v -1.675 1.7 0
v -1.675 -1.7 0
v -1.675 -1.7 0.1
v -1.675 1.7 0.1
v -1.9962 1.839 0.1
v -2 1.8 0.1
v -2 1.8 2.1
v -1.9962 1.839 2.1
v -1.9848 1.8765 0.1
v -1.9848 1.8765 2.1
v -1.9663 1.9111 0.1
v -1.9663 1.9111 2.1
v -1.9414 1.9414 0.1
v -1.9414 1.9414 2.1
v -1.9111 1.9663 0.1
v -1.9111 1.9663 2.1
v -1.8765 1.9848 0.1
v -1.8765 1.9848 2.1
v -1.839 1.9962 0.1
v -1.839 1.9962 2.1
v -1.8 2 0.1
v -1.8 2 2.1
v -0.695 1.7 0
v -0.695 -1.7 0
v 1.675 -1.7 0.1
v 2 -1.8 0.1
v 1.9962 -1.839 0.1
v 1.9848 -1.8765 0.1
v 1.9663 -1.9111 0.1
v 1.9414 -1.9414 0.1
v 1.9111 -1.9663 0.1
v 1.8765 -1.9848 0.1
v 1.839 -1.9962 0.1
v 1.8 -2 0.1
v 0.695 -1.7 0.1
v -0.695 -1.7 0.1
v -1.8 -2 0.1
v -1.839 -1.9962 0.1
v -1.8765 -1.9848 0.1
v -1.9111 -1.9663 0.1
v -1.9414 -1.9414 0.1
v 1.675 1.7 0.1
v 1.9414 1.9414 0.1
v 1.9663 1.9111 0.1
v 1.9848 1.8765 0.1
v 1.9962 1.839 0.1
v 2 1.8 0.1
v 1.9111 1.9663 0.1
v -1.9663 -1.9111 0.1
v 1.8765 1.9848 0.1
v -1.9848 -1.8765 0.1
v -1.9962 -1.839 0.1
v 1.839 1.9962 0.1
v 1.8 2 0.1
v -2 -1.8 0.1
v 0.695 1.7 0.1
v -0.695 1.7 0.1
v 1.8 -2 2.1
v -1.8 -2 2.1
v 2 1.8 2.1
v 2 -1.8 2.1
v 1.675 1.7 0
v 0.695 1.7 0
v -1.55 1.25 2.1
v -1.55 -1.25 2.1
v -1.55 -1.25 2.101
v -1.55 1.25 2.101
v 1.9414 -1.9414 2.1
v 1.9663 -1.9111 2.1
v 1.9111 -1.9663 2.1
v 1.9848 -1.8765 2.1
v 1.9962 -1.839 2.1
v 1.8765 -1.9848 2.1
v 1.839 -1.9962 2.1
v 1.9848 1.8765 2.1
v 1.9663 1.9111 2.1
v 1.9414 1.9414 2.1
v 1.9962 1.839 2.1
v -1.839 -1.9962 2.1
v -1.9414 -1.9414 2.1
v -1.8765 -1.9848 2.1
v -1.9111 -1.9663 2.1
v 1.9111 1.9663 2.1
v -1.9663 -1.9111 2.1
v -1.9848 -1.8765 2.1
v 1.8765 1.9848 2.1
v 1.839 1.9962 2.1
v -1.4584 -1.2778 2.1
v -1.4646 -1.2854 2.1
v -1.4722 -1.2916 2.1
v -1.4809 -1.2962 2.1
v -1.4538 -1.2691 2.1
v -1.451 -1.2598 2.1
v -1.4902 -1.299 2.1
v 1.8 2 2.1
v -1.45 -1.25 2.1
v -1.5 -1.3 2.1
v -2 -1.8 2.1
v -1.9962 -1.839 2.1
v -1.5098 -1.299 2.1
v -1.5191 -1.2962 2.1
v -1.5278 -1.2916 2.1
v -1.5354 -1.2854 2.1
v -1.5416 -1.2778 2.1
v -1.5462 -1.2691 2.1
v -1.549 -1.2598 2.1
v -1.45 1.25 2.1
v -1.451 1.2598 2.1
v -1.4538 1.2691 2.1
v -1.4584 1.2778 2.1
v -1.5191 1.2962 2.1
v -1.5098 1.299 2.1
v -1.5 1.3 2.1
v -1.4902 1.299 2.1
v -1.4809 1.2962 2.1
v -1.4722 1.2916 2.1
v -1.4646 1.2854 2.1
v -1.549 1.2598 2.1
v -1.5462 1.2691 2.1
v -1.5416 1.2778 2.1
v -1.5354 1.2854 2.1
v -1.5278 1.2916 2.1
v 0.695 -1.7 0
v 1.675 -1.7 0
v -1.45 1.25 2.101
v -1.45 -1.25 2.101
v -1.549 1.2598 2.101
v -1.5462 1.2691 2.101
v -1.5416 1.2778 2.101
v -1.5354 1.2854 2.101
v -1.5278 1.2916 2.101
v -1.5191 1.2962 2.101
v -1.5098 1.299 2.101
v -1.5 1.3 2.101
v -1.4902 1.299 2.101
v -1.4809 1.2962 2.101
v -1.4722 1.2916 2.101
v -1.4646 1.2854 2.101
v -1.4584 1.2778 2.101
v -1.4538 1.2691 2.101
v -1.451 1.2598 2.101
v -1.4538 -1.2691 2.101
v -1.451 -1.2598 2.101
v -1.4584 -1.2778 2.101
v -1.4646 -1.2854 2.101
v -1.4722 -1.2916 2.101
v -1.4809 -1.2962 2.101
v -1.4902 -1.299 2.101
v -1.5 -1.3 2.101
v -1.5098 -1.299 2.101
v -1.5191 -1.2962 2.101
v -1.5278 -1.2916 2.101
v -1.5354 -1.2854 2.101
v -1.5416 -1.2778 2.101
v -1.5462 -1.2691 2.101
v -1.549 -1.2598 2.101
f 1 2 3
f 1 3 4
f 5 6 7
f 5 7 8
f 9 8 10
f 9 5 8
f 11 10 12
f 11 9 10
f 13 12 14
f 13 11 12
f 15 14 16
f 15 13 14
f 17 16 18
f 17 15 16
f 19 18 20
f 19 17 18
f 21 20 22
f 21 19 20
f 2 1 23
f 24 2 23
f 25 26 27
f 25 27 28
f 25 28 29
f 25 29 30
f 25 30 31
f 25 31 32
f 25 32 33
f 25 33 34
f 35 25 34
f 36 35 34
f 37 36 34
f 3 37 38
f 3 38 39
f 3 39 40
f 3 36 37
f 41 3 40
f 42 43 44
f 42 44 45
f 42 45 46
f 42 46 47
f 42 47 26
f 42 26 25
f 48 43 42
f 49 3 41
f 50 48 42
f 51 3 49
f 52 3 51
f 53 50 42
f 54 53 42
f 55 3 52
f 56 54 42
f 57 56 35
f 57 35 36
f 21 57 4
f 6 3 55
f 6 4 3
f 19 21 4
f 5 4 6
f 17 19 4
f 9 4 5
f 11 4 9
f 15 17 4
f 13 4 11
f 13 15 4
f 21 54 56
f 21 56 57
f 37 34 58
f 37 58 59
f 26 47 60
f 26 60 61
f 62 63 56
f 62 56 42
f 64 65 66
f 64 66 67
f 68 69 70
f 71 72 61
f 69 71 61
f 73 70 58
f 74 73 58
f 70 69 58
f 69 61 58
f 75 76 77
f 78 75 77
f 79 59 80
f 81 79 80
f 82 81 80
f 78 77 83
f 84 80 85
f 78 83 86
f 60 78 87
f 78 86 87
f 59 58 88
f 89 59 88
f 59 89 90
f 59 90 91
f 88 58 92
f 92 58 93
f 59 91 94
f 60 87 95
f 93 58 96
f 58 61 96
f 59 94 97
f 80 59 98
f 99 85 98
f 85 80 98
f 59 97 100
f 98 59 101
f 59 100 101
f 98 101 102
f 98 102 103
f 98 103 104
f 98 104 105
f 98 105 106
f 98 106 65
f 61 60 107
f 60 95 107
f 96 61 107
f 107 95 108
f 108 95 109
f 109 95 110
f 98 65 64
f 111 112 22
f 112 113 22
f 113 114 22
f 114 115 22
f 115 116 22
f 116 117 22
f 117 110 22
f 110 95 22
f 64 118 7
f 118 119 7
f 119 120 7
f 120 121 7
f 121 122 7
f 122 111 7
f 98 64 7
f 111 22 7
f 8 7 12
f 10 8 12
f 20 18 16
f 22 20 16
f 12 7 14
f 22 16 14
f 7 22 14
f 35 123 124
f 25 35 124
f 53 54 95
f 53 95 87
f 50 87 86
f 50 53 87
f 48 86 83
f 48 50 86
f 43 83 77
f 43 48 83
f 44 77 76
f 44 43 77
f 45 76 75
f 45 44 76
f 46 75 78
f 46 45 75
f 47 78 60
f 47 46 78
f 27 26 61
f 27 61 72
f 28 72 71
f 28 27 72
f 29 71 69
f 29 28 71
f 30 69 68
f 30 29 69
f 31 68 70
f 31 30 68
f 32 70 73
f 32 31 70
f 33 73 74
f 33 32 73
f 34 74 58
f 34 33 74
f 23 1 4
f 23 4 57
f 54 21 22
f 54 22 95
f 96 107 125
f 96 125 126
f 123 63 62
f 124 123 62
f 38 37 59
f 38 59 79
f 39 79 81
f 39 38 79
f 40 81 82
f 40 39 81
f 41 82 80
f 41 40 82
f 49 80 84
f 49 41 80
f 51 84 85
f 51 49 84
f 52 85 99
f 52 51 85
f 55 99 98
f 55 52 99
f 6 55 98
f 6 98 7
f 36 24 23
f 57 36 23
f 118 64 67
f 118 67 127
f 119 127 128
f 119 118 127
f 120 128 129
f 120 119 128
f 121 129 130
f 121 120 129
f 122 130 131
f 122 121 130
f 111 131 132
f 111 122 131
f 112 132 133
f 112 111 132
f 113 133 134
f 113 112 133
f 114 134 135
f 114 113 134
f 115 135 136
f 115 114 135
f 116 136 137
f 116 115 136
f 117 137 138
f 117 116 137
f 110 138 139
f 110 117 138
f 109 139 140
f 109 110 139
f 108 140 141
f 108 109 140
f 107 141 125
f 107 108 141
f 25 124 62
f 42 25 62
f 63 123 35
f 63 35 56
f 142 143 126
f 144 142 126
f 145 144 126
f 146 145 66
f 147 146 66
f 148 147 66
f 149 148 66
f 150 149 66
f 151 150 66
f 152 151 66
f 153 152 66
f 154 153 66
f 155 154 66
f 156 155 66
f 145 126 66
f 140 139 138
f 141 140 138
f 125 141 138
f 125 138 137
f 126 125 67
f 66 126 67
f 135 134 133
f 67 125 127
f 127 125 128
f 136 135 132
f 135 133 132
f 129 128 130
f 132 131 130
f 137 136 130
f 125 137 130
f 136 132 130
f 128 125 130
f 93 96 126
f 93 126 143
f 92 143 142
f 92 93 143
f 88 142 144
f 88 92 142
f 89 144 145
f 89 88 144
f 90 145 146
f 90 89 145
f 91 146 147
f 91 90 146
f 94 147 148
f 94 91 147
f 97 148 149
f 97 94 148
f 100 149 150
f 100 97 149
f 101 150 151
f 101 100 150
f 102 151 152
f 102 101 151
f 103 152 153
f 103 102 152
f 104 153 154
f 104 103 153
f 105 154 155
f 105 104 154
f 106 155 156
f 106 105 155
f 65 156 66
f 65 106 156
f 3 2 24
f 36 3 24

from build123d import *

# Parameters (mm, degrees)
ESQUISSE2_W  = 0.98
ESQUISSE2_H  = 3.4
PADS_DEPTH   = 0.1
PADS_2_DEPTH = 0.1
BODY_DEPTH   = 2
MARK_DEPTH   = 0.001


with BuildPart() as part:
    # Esquisse2 → pads (new body)
    with BuildSketch(Plane.XY):
        with Locations((-1.185, 0)):
            Rectangle(ESQUISSE2_W, ESQUISSE2_H)
    extrude(amount=PADS_DEPTH)



with BuildPart() as body_2:
    # Esquisse2 → pads 2 (new body)
    with BuildSketch(Plane.XY):
        with Locations((1.185, 0)):
            Rectangle(ESQUISSE2_W, ESQUISSE2_H)
    extrude(amount=PADS_2_DEPTH)


with BuildPart() as part_1:
    add(part.part)

    add(body_2.part)  # body merges body 2
    # Esquisse1 → body (add)
    with BuildSketch(Plane.XY.offset(0.1)):
        with BuildLine():
            Line((-1.8, 2), (1.8, 2))
            ThreePointArc((1.8, 2), (1.941421356, 1.941421356), (2, 1.8))
            Line((2, 1.8), (2, -1.8))
            ThreePointArc((2, -1.8), (1.941421356, -1.941421356), (1.8, -2))
            Line((1.8, -2), (-1.8, -2))
            ThreePointArc((-1.8, -2), (-1.941421356, -1.941421356), (-2, -1.8))
            Line((-2, -1.8), (-2, 1.8))
            ThreePointArc((-2, 1.8), (-1.941421356, 1.941421356), (-1.8, 2))
        make_face()
    extrude(amount=BODY_DEPTH)

    # Esquisse3 → mark (add)
    with BuildSketch(Plane.XY.offset(2.1)):
        with BuildLine():
            Line((-1.55, -1.25), (-1.55, 1.25))
            ThreePointArc((-1.55, 1.25), (-1.5, 1.3), (-1.45, 1.25))
            Line((-1.45, 1.25), (-1.45, -1.25))
            ThreePointArc((-1.45, -1.25), (-1.5, -1.3), (-1.55, -1.25))
        make_face()
    extrude(amount=MARK_DEPTH)


solid = part_1.part
